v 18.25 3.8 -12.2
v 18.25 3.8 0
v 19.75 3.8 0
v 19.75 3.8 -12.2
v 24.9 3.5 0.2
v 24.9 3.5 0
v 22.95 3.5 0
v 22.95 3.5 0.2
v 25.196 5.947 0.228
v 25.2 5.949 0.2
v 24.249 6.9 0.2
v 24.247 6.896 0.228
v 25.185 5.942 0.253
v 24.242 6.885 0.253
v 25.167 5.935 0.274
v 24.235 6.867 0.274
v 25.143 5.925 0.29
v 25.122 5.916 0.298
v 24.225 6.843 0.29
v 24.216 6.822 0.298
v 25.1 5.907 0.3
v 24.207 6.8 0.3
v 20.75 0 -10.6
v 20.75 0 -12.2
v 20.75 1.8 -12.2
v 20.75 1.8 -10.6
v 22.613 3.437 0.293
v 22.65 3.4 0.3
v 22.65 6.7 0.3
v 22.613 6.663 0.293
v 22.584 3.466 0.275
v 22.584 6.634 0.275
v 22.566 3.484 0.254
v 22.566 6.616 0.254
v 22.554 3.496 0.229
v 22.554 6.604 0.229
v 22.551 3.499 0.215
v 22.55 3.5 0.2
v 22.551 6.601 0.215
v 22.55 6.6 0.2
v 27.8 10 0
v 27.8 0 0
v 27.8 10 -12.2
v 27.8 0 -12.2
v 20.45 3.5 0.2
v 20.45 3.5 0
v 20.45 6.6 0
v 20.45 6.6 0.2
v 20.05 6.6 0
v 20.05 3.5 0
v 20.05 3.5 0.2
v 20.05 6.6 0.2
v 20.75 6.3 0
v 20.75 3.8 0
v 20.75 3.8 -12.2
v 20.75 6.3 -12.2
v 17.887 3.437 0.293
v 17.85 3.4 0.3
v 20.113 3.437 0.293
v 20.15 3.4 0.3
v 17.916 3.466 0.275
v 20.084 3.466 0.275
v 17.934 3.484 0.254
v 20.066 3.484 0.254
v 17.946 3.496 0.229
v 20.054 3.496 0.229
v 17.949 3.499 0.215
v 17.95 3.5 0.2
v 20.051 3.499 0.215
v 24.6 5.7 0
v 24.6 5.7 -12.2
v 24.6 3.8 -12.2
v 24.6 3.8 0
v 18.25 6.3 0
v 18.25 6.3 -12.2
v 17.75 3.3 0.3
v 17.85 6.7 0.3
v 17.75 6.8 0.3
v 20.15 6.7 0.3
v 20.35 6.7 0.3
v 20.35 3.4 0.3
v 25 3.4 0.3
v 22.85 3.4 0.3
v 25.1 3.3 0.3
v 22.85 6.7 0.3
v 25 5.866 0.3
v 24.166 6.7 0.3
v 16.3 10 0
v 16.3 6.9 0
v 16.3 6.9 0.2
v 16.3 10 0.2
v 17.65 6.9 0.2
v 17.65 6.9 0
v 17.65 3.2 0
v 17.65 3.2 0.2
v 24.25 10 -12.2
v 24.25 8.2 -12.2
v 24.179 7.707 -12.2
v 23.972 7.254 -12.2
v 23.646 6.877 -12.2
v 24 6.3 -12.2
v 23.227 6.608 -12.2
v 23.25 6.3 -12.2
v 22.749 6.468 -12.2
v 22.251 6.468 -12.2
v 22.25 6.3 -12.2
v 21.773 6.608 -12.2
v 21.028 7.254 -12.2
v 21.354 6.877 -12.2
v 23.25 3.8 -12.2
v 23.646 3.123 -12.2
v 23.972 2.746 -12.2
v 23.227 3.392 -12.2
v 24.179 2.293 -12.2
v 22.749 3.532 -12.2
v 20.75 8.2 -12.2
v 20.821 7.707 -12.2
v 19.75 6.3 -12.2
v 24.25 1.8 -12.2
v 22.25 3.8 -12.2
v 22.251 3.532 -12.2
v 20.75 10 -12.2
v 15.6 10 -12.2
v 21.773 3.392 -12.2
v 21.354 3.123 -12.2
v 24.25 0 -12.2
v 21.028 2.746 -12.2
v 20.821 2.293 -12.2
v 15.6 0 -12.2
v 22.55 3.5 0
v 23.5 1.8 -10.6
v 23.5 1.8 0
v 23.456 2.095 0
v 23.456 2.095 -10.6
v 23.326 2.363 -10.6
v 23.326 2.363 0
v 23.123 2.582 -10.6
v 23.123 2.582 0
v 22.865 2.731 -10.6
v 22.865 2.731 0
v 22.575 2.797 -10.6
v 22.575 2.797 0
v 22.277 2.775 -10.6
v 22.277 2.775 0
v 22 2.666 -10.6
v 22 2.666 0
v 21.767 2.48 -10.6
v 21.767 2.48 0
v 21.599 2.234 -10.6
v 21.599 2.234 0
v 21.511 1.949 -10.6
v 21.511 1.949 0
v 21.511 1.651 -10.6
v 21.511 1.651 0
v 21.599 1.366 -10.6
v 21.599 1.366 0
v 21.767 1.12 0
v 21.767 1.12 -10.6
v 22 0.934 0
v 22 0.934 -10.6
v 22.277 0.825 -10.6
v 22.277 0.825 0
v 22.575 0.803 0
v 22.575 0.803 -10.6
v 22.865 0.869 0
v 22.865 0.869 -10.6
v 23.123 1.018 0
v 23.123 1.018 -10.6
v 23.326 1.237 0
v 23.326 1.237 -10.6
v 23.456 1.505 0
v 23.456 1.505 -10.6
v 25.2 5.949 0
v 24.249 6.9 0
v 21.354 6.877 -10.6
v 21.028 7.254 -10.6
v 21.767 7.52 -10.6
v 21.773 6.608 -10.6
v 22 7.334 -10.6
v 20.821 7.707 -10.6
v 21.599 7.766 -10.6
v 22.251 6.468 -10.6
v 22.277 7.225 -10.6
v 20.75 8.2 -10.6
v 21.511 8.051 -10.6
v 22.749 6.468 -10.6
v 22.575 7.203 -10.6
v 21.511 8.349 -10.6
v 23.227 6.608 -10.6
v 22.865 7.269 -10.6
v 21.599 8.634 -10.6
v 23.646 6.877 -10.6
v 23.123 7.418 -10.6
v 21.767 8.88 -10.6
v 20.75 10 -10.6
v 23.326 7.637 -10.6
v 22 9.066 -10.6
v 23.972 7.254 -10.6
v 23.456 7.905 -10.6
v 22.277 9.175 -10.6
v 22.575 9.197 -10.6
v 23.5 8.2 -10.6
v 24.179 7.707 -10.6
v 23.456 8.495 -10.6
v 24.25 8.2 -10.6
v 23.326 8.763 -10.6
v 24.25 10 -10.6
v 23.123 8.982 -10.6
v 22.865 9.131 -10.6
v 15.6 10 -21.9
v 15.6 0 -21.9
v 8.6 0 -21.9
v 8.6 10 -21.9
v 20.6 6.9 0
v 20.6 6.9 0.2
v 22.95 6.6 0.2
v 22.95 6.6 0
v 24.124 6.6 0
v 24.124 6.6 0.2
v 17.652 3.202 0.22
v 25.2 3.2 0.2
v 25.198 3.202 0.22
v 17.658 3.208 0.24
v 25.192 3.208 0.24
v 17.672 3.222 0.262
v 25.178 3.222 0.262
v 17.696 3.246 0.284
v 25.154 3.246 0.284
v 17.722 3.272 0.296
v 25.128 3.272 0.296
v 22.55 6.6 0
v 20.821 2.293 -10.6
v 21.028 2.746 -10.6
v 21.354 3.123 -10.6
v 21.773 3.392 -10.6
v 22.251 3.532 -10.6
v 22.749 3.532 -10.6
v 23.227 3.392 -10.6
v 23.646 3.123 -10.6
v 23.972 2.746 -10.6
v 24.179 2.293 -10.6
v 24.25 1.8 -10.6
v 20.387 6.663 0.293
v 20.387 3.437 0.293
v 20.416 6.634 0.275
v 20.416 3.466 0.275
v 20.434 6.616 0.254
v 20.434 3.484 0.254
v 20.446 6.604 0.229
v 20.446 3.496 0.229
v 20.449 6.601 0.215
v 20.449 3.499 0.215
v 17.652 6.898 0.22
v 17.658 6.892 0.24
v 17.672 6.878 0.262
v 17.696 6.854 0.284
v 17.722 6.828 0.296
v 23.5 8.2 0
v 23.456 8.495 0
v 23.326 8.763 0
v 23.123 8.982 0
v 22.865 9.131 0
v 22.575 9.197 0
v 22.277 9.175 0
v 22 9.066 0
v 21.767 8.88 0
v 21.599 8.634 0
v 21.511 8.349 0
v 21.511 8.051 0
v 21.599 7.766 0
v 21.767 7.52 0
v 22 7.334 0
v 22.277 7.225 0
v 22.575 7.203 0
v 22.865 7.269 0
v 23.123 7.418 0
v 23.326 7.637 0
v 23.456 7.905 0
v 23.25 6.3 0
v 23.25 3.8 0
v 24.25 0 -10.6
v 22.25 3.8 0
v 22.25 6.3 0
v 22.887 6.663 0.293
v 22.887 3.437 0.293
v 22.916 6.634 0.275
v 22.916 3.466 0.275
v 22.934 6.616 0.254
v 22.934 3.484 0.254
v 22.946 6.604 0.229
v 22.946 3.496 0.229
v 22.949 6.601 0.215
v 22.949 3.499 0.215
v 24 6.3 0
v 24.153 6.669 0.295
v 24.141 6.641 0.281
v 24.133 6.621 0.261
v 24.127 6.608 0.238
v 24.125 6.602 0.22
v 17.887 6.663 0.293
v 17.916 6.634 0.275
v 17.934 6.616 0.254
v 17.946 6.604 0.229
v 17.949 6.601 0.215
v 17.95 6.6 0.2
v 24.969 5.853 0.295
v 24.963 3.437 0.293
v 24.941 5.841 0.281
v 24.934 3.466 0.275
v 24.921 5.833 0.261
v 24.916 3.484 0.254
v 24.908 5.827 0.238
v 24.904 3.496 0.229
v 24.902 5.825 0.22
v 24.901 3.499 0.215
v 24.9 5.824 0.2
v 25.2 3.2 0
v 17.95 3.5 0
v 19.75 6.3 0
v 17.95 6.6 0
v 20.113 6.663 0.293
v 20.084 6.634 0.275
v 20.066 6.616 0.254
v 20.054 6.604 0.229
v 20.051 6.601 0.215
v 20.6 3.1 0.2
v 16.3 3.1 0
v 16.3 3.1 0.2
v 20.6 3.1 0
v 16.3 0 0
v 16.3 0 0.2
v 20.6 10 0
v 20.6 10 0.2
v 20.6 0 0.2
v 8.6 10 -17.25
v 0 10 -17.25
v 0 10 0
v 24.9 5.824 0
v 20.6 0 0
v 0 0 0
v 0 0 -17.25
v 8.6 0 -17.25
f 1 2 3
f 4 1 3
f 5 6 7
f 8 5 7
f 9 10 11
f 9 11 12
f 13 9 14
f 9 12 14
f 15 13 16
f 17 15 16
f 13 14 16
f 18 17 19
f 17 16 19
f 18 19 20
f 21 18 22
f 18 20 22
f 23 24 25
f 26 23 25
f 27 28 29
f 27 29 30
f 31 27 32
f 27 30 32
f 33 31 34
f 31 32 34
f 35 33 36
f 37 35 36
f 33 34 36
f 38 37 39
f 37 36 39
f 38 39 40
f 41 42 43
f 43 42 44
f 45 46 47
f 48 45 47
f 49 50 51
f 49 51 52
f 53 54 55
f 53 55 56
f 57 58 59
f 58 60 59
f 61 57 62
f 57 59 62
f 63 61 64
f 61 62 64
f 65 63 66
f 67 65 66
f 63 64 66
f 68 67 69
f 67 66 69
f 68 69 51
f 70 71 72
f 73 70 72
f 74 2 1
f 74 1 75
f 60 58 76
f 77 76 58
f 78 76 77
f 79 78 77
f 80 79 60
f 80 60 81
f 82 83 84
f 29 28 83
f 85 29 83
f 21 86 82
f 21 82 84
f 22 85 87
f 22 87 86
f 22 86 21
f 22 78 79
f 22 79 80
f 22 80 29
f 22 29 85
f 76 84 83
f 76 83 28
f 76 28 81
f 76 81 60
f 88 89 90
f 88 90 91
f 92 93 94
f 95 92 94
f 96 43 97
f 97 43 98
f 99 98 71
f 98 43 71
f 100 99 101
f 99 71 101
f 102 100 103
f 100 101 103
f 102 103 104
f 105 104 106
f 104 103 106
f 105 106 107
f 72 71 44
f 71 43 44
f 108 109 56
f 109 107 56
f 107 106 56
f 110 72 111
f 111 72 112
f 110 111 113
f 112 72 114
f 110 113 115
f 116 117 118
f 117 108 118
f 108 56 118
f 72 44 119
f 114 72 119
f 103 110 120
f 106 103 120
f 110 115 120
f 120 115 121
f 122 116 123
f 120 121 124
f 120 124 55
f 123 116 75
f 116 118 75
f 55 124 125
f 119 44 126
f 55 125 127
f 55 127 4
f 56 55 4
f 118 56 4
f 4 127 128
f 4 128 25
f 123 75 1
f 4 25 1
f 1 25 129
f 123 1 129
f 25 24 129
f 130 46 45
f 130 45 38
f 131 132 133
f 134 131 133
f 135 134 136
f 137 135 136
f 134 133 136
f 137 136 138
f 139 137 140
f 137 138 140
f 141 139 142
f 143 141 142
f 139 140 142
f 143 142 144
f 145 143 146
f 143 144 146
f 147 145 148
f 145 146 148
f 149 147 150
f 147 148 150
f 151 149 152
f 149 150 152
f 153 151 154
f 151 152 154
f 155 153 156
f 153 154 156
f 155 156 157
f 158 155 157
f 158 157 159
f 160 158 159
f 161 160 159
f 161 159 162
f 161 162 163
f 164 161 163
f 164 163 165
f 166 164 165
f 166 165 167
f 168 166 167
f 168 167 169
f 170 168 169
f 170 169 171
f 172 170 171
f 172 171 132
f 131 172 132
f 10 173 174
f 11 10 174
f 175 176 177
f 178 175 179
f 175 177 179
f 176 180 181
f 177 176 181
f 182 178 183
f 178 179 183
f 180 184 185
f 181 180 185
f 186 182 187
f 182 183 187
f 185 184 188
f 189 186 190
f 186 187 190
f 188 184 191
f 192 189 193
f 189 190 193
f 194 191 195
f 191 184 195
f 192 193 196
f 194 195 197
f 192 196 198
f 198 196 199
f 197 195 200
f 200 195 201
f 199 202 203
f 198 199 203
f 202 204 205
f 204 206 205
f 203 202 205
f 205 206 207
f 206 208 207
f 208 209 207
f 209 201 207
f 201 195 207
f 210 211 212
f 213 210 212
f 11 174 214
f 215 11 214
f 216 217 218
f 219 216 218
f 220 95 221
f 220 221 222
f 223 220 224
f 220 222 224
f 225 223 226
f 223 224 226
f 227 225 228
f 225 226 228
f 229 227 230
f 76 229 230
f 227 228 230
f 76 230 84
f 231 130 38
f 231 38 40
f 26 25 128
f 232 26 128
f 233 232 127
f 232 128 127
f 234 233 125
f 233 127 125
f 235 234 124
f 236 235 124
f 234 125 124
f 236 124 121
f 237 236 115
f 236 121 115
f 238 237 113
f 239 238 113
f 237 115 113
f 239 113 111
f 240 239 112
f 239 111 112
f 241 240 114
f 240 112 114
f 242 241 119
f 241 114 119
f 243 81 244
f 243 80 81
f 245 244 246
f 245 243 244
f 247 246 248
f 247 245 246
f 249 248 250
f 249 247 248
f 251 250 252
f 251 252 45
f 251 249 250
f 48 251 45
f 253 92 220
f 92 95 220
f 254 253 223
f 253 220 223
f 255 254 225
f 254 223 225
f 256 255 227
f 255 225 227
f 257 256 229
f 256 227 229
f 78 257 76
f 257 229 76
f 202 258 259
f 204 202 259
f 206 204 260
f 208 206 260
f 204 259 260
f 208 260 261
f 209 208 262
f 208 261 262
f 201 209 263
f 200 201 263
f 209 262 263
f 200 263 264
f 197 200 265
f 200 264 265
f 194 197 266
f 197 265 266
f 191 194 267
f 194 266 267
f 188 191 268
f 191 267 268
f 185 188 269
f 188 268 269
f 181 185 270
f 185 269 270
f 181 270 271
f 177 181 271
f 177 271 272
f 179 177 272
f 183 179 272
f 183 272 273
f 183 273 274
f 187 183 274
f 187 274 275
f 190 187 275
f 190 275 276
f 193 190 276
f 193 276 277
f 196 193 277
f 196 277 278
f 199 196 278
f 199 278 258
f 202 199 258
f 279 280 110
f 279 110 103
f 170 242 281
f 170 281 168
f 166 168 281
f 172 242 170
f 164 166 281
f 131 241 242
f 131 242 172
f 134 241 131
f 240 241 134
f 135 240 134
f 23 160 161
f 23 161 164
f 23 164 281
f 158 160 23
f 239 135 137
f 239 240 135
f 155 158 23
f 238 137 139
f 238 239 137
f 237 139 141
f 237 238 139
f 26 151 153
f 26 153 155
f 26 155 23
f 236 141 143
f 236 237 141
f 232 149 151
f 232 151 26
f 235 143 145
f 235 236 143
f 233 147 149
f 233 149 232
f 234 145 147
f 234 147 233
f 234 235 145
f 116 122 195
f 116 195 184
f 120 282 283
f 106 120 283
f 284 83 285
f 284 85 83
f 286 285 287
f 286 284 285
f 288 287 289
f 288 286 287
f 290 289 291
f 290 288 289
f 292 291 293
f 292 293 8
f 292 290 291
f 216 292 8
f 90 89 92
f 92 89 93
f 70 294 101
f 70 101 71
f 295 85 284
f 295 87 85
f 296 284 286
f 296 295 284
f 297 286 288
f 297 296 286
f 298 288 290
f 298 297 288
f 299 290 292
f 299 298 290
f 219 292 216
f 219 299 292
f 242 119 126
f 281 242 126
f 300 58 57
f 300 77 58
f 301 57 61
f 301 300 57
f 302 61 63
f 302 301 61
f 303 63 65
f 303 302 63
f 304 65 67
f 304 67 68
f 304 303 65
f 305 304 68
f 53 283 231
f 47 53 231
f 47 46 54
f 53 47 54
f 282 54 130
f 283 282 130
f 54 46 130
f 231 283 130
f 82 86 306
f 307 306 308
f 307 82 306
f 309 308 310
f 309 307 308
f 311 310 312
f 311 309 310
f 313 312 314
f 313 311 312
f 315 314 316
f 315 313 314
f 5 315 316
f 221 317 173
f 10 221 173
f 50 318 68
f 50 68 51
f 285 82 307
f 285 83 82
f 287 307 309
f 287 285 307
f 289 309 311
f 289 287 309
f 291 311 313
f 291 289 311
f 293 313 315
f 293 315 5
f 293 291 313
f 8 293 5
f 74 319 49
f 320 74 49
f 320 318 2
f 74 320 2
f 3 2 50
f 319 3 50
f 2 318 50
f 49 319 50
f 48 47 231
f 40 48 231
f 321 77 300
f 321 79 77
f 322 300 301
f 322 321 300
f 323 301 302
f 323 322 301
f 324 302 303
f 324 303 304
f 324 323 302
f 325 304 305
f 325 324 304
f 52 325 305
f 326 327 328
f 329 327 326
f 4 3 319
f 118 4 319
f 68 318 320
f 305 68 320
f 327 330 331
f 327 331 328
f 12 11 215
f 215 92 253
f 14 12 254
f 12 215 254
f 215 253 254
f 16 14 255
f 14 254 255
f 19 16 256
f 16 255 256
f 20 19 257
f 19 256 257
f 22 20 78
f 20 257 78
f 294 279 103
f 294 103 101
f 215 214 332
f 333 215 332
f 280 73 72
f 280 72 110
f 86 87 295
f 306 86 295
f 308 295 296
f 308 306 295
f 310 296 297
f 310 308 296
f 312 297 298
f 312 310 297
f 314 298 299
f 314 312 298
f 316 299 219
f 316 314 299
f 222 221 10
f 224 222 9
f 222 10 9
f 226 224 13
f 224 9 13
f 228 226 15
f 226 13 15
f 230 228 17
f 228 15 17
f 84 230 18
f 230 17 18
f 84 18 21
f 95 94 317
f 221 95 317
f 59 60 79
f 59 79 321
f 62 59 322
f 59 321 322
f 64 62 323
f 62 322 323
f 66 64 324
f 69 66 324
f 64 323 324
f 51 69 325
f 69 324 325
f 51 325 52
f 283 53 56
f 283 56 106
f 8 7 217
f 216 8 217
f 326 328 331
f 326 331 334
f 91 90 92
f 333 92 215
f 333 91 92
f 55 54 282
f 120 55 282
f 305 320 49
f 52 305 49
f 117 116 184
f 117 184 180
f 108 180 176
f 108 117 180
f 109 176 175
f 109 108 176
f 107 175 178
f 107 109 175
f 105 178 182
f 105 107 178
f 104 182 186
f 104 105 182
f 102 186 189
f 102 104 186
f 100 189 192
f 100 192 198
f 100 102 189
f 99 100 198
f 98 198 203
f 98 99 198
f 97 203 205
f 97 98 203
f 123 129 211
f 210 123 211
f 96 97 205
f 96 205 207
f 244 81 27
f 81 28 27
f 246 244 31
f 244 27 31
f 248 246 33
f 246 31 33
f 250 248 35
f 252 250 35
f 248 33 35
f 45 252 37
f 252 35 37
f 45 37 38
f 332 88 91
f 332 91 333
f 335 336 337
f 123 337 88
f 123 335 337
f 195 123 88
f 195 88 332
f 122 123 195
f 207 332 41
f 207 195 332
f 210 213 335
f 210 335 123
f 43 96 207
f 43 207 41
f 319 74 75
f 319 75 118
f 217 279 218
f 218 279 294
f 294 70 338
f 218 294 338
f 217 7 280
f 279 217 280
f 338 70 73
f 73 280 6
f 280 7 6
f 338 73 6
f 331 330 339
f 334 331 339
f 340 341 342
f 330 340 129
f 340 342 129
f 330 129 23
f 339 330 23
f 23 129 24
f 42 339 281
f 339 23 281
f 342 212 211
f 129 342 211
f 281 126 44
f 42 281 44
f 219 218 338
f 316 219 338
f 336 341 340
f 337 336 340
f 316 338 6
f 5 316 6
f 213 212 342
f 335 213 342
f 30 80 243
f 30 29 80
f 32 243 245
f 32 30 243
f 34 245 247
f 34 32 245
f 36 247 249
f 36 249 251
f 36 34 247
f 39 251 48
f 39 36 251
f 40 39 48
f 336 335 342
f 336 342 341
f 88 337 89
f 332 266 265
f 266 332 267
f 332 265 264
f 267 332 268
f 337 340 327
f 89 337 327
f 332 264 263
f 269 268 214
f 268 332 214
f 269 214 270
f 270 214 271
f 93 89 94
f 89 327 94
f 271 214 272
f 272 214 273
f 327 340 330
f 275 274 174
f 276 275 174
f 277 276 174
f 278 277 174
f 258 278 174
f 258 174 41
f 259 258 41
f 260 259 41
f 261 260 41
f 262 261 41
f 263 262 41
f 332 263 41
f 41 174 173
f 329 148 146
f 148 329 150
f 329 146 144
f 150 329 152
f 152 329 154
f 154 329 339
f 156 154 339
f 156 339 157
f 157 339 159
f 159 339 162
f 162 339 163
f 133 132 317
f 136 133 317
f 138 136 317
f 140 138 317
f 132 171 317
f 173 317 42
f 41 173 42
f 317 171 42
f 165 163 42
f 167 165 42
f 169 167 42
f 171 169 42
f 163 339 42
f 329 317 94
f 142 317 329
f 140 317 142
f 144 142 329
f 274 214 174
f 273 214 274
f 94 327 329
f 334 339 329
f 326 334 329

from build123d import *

# Parameters (mm, degrees)
BOSS_EXTRUDE1_DEPTH = 10
SKETCH2_W           = 1.5
SKETCH2_H           = 2.5
CUT_EXTRUDE1_DEPTH  = 17.9
SKETCH3_R           = 1
CUT_EXTRUDE2_DEPTH  = 37.775671306
CUT_EXTRUDE3_DEPTH  = 1.6
SKETCH5_W           = 2.1
SKETCH5_H           = 3.1
BOSS_EXTRUDE2_DEPTH = 0.3
FILLET1_R           = 0.1
SKETCH6_W           = 4.3
SKETCH6_H           = 3.1
BOSS_EXTRUDE3_DEPTH = 0.2


with BuildPart() as part:
    # Sketch1 → Boss-Extrude1 (new body)
    with BuildSketch(Plane(origin=(0, 0, 0), x_dir=(1, 0, 0), z_dir=(0, 1, 0))):
        Polygon((0, 0), (27.8, 0), (27.8, 12.2), (15.6, 12.2), (15.6, 21.9), (8.6, 21.9), (8.6, 17.25), (0, 17.25), align=None)
    extrude(amount=BOSS_EXTRUDE1_DEPTH)

    # Sketch2 → Cut-Extrude1 (cut)
    with BuildSketch(Plane.XY):
        with Locations((19, 5.05)):
            Rectangle(SKETCH2_W, SKETCH2_H)
        with Locations((21.5, 5.05)):
            Rectangle(SKETCH2_W, SKETCH2_H)
        Polygon((23.25, 6.3), (24, 6.3), (24.6, 5.7), (24.6, 3.8), (23.25, 3.8), align=None)
    extrude(amount=-CUT_EXTRUDE1_DEPTH, mode=Mode.SUBTRACT)

    # Sketch3 → Cut-Extrude2 (cut, through all)
    with BuildSketch(Plane.XY):
        with Locations((22.5, 8.2)):
            Circle(SKETCH3_R)
        with Locations((22.5, 1.8)):
            Circle(SKETCH3_R)
    extrude(amount=-CUT_EXTRUDE2_DEPTH, mode=Mode.SUBTRACT)

    # Sketch4 → Cut-Extrude3 (cut)
    with BuildSketch(Plane(origin=(0, 0, -12.2), x_dir=(-1, 0, 0), z_dir=(0, 0, -1))):
        with BuildLine():
            Line((-24.25, 8.2), (-24.25, 11.165081073))
            Line((-24.25, 11.165081073), (-20.75, 11.165081073))
            Line((-20.75, 11.165081073), (-20.75, 8.2))
            ThreePointArc((-20.75, 8.2), (-22.5, 6.45), (-24.25, 8.2))
        make_face()
        with BuildLine():
            Line((-20.75, -1.165081073), (-20.75, 1.8))
            ThreePointArc((-20.75, 1.8), (-22.5, 3.55), (-24.25, 1.8))
            Line((-24.25, 1.8), (-24.25, -1.165081073))
            Line((-24.25, -1.165081073), (-20.75, -1.165081073))
        make_face()
    extrude(amount=-CUT_EXTRUDE3_DEPTH, mode=Mode.SUBTRACT)

    # Sketch5 → Boss-Extrude2 (add)
    with BuildSketch(Plane.XY):
        Polygon((17.65, 6.9), (17.65, 3.2), (20.35, 3.2), (25.2, 3.2), (25.2, 5.948528137), (24.248528137, 6.9), align=None)
        with Locations((19, 5.05)):
            Rectangle(SKETCH5_W, SKETCH5_H, mode=Mode.SUBTRACT)
        with Locations((21.5, 5.05)):
            Rectangle(SKETCH5_W, SKETCH5_H, mode=Mode.SUBTRACT)
        Polygon((22.95, 6.6), (24.124264069, 6.6), (24.9, 5.824264069), (24.9, 3.5), (22.95, 3.5), align=None, mode=Mode.SUBTRACT)
    extrude(amount=BOSS_EXTRUDE2_DEPTH)

    # Fillet1
    fillet1_edges = [part.edges().sort_by_distance(p)[0] for p in [
        (20.949264069, 6.9, 0.3),
        (17.65, 5.05, 0.3),
        (21.425, 3.2, 0.3),
        (25.2, 4.574264069, 0.3),
        (24.724264069, 6.424264069, 0.3),
        (17.95, 5.05, 0.3),
        (19, 3.5, 0.3),
        (20.05, 5.05, 0.3),
        (19, 6.6, 0.3),
        (20.45, 5.05, 0.3),
        (21.5, 3.5, 0.3),
        (22.55, 5.05, 0.3),
        (21.5, 6.6, 0.3),
        (22.95, 5.05, 0.3),
        (23.925, 3.5, 0.3),
        (24.9, 4.662132034, 0.3),
        (24.512132034, 6.212132034, 0.3),
        (23.537132034, 6.6, 0.3),
    ]]
    fillet(fillet1_edges, radius=FILLET1_R)

    # Sketch6 → Boss-Extrude3 (add)
    with BuildSketch(Plane.XY):
        with Locations((18.45, 8.45)):
            Rectangle(SKETCH6_W, SKETCH6_H)
        with Locations((18.45, 1.55)):
            Rectangle(SKETCH6_W, SKETCH6_H)
    extrude(amount=BOSS_EXTRUDE3_DEPTH)


solid = part.part
